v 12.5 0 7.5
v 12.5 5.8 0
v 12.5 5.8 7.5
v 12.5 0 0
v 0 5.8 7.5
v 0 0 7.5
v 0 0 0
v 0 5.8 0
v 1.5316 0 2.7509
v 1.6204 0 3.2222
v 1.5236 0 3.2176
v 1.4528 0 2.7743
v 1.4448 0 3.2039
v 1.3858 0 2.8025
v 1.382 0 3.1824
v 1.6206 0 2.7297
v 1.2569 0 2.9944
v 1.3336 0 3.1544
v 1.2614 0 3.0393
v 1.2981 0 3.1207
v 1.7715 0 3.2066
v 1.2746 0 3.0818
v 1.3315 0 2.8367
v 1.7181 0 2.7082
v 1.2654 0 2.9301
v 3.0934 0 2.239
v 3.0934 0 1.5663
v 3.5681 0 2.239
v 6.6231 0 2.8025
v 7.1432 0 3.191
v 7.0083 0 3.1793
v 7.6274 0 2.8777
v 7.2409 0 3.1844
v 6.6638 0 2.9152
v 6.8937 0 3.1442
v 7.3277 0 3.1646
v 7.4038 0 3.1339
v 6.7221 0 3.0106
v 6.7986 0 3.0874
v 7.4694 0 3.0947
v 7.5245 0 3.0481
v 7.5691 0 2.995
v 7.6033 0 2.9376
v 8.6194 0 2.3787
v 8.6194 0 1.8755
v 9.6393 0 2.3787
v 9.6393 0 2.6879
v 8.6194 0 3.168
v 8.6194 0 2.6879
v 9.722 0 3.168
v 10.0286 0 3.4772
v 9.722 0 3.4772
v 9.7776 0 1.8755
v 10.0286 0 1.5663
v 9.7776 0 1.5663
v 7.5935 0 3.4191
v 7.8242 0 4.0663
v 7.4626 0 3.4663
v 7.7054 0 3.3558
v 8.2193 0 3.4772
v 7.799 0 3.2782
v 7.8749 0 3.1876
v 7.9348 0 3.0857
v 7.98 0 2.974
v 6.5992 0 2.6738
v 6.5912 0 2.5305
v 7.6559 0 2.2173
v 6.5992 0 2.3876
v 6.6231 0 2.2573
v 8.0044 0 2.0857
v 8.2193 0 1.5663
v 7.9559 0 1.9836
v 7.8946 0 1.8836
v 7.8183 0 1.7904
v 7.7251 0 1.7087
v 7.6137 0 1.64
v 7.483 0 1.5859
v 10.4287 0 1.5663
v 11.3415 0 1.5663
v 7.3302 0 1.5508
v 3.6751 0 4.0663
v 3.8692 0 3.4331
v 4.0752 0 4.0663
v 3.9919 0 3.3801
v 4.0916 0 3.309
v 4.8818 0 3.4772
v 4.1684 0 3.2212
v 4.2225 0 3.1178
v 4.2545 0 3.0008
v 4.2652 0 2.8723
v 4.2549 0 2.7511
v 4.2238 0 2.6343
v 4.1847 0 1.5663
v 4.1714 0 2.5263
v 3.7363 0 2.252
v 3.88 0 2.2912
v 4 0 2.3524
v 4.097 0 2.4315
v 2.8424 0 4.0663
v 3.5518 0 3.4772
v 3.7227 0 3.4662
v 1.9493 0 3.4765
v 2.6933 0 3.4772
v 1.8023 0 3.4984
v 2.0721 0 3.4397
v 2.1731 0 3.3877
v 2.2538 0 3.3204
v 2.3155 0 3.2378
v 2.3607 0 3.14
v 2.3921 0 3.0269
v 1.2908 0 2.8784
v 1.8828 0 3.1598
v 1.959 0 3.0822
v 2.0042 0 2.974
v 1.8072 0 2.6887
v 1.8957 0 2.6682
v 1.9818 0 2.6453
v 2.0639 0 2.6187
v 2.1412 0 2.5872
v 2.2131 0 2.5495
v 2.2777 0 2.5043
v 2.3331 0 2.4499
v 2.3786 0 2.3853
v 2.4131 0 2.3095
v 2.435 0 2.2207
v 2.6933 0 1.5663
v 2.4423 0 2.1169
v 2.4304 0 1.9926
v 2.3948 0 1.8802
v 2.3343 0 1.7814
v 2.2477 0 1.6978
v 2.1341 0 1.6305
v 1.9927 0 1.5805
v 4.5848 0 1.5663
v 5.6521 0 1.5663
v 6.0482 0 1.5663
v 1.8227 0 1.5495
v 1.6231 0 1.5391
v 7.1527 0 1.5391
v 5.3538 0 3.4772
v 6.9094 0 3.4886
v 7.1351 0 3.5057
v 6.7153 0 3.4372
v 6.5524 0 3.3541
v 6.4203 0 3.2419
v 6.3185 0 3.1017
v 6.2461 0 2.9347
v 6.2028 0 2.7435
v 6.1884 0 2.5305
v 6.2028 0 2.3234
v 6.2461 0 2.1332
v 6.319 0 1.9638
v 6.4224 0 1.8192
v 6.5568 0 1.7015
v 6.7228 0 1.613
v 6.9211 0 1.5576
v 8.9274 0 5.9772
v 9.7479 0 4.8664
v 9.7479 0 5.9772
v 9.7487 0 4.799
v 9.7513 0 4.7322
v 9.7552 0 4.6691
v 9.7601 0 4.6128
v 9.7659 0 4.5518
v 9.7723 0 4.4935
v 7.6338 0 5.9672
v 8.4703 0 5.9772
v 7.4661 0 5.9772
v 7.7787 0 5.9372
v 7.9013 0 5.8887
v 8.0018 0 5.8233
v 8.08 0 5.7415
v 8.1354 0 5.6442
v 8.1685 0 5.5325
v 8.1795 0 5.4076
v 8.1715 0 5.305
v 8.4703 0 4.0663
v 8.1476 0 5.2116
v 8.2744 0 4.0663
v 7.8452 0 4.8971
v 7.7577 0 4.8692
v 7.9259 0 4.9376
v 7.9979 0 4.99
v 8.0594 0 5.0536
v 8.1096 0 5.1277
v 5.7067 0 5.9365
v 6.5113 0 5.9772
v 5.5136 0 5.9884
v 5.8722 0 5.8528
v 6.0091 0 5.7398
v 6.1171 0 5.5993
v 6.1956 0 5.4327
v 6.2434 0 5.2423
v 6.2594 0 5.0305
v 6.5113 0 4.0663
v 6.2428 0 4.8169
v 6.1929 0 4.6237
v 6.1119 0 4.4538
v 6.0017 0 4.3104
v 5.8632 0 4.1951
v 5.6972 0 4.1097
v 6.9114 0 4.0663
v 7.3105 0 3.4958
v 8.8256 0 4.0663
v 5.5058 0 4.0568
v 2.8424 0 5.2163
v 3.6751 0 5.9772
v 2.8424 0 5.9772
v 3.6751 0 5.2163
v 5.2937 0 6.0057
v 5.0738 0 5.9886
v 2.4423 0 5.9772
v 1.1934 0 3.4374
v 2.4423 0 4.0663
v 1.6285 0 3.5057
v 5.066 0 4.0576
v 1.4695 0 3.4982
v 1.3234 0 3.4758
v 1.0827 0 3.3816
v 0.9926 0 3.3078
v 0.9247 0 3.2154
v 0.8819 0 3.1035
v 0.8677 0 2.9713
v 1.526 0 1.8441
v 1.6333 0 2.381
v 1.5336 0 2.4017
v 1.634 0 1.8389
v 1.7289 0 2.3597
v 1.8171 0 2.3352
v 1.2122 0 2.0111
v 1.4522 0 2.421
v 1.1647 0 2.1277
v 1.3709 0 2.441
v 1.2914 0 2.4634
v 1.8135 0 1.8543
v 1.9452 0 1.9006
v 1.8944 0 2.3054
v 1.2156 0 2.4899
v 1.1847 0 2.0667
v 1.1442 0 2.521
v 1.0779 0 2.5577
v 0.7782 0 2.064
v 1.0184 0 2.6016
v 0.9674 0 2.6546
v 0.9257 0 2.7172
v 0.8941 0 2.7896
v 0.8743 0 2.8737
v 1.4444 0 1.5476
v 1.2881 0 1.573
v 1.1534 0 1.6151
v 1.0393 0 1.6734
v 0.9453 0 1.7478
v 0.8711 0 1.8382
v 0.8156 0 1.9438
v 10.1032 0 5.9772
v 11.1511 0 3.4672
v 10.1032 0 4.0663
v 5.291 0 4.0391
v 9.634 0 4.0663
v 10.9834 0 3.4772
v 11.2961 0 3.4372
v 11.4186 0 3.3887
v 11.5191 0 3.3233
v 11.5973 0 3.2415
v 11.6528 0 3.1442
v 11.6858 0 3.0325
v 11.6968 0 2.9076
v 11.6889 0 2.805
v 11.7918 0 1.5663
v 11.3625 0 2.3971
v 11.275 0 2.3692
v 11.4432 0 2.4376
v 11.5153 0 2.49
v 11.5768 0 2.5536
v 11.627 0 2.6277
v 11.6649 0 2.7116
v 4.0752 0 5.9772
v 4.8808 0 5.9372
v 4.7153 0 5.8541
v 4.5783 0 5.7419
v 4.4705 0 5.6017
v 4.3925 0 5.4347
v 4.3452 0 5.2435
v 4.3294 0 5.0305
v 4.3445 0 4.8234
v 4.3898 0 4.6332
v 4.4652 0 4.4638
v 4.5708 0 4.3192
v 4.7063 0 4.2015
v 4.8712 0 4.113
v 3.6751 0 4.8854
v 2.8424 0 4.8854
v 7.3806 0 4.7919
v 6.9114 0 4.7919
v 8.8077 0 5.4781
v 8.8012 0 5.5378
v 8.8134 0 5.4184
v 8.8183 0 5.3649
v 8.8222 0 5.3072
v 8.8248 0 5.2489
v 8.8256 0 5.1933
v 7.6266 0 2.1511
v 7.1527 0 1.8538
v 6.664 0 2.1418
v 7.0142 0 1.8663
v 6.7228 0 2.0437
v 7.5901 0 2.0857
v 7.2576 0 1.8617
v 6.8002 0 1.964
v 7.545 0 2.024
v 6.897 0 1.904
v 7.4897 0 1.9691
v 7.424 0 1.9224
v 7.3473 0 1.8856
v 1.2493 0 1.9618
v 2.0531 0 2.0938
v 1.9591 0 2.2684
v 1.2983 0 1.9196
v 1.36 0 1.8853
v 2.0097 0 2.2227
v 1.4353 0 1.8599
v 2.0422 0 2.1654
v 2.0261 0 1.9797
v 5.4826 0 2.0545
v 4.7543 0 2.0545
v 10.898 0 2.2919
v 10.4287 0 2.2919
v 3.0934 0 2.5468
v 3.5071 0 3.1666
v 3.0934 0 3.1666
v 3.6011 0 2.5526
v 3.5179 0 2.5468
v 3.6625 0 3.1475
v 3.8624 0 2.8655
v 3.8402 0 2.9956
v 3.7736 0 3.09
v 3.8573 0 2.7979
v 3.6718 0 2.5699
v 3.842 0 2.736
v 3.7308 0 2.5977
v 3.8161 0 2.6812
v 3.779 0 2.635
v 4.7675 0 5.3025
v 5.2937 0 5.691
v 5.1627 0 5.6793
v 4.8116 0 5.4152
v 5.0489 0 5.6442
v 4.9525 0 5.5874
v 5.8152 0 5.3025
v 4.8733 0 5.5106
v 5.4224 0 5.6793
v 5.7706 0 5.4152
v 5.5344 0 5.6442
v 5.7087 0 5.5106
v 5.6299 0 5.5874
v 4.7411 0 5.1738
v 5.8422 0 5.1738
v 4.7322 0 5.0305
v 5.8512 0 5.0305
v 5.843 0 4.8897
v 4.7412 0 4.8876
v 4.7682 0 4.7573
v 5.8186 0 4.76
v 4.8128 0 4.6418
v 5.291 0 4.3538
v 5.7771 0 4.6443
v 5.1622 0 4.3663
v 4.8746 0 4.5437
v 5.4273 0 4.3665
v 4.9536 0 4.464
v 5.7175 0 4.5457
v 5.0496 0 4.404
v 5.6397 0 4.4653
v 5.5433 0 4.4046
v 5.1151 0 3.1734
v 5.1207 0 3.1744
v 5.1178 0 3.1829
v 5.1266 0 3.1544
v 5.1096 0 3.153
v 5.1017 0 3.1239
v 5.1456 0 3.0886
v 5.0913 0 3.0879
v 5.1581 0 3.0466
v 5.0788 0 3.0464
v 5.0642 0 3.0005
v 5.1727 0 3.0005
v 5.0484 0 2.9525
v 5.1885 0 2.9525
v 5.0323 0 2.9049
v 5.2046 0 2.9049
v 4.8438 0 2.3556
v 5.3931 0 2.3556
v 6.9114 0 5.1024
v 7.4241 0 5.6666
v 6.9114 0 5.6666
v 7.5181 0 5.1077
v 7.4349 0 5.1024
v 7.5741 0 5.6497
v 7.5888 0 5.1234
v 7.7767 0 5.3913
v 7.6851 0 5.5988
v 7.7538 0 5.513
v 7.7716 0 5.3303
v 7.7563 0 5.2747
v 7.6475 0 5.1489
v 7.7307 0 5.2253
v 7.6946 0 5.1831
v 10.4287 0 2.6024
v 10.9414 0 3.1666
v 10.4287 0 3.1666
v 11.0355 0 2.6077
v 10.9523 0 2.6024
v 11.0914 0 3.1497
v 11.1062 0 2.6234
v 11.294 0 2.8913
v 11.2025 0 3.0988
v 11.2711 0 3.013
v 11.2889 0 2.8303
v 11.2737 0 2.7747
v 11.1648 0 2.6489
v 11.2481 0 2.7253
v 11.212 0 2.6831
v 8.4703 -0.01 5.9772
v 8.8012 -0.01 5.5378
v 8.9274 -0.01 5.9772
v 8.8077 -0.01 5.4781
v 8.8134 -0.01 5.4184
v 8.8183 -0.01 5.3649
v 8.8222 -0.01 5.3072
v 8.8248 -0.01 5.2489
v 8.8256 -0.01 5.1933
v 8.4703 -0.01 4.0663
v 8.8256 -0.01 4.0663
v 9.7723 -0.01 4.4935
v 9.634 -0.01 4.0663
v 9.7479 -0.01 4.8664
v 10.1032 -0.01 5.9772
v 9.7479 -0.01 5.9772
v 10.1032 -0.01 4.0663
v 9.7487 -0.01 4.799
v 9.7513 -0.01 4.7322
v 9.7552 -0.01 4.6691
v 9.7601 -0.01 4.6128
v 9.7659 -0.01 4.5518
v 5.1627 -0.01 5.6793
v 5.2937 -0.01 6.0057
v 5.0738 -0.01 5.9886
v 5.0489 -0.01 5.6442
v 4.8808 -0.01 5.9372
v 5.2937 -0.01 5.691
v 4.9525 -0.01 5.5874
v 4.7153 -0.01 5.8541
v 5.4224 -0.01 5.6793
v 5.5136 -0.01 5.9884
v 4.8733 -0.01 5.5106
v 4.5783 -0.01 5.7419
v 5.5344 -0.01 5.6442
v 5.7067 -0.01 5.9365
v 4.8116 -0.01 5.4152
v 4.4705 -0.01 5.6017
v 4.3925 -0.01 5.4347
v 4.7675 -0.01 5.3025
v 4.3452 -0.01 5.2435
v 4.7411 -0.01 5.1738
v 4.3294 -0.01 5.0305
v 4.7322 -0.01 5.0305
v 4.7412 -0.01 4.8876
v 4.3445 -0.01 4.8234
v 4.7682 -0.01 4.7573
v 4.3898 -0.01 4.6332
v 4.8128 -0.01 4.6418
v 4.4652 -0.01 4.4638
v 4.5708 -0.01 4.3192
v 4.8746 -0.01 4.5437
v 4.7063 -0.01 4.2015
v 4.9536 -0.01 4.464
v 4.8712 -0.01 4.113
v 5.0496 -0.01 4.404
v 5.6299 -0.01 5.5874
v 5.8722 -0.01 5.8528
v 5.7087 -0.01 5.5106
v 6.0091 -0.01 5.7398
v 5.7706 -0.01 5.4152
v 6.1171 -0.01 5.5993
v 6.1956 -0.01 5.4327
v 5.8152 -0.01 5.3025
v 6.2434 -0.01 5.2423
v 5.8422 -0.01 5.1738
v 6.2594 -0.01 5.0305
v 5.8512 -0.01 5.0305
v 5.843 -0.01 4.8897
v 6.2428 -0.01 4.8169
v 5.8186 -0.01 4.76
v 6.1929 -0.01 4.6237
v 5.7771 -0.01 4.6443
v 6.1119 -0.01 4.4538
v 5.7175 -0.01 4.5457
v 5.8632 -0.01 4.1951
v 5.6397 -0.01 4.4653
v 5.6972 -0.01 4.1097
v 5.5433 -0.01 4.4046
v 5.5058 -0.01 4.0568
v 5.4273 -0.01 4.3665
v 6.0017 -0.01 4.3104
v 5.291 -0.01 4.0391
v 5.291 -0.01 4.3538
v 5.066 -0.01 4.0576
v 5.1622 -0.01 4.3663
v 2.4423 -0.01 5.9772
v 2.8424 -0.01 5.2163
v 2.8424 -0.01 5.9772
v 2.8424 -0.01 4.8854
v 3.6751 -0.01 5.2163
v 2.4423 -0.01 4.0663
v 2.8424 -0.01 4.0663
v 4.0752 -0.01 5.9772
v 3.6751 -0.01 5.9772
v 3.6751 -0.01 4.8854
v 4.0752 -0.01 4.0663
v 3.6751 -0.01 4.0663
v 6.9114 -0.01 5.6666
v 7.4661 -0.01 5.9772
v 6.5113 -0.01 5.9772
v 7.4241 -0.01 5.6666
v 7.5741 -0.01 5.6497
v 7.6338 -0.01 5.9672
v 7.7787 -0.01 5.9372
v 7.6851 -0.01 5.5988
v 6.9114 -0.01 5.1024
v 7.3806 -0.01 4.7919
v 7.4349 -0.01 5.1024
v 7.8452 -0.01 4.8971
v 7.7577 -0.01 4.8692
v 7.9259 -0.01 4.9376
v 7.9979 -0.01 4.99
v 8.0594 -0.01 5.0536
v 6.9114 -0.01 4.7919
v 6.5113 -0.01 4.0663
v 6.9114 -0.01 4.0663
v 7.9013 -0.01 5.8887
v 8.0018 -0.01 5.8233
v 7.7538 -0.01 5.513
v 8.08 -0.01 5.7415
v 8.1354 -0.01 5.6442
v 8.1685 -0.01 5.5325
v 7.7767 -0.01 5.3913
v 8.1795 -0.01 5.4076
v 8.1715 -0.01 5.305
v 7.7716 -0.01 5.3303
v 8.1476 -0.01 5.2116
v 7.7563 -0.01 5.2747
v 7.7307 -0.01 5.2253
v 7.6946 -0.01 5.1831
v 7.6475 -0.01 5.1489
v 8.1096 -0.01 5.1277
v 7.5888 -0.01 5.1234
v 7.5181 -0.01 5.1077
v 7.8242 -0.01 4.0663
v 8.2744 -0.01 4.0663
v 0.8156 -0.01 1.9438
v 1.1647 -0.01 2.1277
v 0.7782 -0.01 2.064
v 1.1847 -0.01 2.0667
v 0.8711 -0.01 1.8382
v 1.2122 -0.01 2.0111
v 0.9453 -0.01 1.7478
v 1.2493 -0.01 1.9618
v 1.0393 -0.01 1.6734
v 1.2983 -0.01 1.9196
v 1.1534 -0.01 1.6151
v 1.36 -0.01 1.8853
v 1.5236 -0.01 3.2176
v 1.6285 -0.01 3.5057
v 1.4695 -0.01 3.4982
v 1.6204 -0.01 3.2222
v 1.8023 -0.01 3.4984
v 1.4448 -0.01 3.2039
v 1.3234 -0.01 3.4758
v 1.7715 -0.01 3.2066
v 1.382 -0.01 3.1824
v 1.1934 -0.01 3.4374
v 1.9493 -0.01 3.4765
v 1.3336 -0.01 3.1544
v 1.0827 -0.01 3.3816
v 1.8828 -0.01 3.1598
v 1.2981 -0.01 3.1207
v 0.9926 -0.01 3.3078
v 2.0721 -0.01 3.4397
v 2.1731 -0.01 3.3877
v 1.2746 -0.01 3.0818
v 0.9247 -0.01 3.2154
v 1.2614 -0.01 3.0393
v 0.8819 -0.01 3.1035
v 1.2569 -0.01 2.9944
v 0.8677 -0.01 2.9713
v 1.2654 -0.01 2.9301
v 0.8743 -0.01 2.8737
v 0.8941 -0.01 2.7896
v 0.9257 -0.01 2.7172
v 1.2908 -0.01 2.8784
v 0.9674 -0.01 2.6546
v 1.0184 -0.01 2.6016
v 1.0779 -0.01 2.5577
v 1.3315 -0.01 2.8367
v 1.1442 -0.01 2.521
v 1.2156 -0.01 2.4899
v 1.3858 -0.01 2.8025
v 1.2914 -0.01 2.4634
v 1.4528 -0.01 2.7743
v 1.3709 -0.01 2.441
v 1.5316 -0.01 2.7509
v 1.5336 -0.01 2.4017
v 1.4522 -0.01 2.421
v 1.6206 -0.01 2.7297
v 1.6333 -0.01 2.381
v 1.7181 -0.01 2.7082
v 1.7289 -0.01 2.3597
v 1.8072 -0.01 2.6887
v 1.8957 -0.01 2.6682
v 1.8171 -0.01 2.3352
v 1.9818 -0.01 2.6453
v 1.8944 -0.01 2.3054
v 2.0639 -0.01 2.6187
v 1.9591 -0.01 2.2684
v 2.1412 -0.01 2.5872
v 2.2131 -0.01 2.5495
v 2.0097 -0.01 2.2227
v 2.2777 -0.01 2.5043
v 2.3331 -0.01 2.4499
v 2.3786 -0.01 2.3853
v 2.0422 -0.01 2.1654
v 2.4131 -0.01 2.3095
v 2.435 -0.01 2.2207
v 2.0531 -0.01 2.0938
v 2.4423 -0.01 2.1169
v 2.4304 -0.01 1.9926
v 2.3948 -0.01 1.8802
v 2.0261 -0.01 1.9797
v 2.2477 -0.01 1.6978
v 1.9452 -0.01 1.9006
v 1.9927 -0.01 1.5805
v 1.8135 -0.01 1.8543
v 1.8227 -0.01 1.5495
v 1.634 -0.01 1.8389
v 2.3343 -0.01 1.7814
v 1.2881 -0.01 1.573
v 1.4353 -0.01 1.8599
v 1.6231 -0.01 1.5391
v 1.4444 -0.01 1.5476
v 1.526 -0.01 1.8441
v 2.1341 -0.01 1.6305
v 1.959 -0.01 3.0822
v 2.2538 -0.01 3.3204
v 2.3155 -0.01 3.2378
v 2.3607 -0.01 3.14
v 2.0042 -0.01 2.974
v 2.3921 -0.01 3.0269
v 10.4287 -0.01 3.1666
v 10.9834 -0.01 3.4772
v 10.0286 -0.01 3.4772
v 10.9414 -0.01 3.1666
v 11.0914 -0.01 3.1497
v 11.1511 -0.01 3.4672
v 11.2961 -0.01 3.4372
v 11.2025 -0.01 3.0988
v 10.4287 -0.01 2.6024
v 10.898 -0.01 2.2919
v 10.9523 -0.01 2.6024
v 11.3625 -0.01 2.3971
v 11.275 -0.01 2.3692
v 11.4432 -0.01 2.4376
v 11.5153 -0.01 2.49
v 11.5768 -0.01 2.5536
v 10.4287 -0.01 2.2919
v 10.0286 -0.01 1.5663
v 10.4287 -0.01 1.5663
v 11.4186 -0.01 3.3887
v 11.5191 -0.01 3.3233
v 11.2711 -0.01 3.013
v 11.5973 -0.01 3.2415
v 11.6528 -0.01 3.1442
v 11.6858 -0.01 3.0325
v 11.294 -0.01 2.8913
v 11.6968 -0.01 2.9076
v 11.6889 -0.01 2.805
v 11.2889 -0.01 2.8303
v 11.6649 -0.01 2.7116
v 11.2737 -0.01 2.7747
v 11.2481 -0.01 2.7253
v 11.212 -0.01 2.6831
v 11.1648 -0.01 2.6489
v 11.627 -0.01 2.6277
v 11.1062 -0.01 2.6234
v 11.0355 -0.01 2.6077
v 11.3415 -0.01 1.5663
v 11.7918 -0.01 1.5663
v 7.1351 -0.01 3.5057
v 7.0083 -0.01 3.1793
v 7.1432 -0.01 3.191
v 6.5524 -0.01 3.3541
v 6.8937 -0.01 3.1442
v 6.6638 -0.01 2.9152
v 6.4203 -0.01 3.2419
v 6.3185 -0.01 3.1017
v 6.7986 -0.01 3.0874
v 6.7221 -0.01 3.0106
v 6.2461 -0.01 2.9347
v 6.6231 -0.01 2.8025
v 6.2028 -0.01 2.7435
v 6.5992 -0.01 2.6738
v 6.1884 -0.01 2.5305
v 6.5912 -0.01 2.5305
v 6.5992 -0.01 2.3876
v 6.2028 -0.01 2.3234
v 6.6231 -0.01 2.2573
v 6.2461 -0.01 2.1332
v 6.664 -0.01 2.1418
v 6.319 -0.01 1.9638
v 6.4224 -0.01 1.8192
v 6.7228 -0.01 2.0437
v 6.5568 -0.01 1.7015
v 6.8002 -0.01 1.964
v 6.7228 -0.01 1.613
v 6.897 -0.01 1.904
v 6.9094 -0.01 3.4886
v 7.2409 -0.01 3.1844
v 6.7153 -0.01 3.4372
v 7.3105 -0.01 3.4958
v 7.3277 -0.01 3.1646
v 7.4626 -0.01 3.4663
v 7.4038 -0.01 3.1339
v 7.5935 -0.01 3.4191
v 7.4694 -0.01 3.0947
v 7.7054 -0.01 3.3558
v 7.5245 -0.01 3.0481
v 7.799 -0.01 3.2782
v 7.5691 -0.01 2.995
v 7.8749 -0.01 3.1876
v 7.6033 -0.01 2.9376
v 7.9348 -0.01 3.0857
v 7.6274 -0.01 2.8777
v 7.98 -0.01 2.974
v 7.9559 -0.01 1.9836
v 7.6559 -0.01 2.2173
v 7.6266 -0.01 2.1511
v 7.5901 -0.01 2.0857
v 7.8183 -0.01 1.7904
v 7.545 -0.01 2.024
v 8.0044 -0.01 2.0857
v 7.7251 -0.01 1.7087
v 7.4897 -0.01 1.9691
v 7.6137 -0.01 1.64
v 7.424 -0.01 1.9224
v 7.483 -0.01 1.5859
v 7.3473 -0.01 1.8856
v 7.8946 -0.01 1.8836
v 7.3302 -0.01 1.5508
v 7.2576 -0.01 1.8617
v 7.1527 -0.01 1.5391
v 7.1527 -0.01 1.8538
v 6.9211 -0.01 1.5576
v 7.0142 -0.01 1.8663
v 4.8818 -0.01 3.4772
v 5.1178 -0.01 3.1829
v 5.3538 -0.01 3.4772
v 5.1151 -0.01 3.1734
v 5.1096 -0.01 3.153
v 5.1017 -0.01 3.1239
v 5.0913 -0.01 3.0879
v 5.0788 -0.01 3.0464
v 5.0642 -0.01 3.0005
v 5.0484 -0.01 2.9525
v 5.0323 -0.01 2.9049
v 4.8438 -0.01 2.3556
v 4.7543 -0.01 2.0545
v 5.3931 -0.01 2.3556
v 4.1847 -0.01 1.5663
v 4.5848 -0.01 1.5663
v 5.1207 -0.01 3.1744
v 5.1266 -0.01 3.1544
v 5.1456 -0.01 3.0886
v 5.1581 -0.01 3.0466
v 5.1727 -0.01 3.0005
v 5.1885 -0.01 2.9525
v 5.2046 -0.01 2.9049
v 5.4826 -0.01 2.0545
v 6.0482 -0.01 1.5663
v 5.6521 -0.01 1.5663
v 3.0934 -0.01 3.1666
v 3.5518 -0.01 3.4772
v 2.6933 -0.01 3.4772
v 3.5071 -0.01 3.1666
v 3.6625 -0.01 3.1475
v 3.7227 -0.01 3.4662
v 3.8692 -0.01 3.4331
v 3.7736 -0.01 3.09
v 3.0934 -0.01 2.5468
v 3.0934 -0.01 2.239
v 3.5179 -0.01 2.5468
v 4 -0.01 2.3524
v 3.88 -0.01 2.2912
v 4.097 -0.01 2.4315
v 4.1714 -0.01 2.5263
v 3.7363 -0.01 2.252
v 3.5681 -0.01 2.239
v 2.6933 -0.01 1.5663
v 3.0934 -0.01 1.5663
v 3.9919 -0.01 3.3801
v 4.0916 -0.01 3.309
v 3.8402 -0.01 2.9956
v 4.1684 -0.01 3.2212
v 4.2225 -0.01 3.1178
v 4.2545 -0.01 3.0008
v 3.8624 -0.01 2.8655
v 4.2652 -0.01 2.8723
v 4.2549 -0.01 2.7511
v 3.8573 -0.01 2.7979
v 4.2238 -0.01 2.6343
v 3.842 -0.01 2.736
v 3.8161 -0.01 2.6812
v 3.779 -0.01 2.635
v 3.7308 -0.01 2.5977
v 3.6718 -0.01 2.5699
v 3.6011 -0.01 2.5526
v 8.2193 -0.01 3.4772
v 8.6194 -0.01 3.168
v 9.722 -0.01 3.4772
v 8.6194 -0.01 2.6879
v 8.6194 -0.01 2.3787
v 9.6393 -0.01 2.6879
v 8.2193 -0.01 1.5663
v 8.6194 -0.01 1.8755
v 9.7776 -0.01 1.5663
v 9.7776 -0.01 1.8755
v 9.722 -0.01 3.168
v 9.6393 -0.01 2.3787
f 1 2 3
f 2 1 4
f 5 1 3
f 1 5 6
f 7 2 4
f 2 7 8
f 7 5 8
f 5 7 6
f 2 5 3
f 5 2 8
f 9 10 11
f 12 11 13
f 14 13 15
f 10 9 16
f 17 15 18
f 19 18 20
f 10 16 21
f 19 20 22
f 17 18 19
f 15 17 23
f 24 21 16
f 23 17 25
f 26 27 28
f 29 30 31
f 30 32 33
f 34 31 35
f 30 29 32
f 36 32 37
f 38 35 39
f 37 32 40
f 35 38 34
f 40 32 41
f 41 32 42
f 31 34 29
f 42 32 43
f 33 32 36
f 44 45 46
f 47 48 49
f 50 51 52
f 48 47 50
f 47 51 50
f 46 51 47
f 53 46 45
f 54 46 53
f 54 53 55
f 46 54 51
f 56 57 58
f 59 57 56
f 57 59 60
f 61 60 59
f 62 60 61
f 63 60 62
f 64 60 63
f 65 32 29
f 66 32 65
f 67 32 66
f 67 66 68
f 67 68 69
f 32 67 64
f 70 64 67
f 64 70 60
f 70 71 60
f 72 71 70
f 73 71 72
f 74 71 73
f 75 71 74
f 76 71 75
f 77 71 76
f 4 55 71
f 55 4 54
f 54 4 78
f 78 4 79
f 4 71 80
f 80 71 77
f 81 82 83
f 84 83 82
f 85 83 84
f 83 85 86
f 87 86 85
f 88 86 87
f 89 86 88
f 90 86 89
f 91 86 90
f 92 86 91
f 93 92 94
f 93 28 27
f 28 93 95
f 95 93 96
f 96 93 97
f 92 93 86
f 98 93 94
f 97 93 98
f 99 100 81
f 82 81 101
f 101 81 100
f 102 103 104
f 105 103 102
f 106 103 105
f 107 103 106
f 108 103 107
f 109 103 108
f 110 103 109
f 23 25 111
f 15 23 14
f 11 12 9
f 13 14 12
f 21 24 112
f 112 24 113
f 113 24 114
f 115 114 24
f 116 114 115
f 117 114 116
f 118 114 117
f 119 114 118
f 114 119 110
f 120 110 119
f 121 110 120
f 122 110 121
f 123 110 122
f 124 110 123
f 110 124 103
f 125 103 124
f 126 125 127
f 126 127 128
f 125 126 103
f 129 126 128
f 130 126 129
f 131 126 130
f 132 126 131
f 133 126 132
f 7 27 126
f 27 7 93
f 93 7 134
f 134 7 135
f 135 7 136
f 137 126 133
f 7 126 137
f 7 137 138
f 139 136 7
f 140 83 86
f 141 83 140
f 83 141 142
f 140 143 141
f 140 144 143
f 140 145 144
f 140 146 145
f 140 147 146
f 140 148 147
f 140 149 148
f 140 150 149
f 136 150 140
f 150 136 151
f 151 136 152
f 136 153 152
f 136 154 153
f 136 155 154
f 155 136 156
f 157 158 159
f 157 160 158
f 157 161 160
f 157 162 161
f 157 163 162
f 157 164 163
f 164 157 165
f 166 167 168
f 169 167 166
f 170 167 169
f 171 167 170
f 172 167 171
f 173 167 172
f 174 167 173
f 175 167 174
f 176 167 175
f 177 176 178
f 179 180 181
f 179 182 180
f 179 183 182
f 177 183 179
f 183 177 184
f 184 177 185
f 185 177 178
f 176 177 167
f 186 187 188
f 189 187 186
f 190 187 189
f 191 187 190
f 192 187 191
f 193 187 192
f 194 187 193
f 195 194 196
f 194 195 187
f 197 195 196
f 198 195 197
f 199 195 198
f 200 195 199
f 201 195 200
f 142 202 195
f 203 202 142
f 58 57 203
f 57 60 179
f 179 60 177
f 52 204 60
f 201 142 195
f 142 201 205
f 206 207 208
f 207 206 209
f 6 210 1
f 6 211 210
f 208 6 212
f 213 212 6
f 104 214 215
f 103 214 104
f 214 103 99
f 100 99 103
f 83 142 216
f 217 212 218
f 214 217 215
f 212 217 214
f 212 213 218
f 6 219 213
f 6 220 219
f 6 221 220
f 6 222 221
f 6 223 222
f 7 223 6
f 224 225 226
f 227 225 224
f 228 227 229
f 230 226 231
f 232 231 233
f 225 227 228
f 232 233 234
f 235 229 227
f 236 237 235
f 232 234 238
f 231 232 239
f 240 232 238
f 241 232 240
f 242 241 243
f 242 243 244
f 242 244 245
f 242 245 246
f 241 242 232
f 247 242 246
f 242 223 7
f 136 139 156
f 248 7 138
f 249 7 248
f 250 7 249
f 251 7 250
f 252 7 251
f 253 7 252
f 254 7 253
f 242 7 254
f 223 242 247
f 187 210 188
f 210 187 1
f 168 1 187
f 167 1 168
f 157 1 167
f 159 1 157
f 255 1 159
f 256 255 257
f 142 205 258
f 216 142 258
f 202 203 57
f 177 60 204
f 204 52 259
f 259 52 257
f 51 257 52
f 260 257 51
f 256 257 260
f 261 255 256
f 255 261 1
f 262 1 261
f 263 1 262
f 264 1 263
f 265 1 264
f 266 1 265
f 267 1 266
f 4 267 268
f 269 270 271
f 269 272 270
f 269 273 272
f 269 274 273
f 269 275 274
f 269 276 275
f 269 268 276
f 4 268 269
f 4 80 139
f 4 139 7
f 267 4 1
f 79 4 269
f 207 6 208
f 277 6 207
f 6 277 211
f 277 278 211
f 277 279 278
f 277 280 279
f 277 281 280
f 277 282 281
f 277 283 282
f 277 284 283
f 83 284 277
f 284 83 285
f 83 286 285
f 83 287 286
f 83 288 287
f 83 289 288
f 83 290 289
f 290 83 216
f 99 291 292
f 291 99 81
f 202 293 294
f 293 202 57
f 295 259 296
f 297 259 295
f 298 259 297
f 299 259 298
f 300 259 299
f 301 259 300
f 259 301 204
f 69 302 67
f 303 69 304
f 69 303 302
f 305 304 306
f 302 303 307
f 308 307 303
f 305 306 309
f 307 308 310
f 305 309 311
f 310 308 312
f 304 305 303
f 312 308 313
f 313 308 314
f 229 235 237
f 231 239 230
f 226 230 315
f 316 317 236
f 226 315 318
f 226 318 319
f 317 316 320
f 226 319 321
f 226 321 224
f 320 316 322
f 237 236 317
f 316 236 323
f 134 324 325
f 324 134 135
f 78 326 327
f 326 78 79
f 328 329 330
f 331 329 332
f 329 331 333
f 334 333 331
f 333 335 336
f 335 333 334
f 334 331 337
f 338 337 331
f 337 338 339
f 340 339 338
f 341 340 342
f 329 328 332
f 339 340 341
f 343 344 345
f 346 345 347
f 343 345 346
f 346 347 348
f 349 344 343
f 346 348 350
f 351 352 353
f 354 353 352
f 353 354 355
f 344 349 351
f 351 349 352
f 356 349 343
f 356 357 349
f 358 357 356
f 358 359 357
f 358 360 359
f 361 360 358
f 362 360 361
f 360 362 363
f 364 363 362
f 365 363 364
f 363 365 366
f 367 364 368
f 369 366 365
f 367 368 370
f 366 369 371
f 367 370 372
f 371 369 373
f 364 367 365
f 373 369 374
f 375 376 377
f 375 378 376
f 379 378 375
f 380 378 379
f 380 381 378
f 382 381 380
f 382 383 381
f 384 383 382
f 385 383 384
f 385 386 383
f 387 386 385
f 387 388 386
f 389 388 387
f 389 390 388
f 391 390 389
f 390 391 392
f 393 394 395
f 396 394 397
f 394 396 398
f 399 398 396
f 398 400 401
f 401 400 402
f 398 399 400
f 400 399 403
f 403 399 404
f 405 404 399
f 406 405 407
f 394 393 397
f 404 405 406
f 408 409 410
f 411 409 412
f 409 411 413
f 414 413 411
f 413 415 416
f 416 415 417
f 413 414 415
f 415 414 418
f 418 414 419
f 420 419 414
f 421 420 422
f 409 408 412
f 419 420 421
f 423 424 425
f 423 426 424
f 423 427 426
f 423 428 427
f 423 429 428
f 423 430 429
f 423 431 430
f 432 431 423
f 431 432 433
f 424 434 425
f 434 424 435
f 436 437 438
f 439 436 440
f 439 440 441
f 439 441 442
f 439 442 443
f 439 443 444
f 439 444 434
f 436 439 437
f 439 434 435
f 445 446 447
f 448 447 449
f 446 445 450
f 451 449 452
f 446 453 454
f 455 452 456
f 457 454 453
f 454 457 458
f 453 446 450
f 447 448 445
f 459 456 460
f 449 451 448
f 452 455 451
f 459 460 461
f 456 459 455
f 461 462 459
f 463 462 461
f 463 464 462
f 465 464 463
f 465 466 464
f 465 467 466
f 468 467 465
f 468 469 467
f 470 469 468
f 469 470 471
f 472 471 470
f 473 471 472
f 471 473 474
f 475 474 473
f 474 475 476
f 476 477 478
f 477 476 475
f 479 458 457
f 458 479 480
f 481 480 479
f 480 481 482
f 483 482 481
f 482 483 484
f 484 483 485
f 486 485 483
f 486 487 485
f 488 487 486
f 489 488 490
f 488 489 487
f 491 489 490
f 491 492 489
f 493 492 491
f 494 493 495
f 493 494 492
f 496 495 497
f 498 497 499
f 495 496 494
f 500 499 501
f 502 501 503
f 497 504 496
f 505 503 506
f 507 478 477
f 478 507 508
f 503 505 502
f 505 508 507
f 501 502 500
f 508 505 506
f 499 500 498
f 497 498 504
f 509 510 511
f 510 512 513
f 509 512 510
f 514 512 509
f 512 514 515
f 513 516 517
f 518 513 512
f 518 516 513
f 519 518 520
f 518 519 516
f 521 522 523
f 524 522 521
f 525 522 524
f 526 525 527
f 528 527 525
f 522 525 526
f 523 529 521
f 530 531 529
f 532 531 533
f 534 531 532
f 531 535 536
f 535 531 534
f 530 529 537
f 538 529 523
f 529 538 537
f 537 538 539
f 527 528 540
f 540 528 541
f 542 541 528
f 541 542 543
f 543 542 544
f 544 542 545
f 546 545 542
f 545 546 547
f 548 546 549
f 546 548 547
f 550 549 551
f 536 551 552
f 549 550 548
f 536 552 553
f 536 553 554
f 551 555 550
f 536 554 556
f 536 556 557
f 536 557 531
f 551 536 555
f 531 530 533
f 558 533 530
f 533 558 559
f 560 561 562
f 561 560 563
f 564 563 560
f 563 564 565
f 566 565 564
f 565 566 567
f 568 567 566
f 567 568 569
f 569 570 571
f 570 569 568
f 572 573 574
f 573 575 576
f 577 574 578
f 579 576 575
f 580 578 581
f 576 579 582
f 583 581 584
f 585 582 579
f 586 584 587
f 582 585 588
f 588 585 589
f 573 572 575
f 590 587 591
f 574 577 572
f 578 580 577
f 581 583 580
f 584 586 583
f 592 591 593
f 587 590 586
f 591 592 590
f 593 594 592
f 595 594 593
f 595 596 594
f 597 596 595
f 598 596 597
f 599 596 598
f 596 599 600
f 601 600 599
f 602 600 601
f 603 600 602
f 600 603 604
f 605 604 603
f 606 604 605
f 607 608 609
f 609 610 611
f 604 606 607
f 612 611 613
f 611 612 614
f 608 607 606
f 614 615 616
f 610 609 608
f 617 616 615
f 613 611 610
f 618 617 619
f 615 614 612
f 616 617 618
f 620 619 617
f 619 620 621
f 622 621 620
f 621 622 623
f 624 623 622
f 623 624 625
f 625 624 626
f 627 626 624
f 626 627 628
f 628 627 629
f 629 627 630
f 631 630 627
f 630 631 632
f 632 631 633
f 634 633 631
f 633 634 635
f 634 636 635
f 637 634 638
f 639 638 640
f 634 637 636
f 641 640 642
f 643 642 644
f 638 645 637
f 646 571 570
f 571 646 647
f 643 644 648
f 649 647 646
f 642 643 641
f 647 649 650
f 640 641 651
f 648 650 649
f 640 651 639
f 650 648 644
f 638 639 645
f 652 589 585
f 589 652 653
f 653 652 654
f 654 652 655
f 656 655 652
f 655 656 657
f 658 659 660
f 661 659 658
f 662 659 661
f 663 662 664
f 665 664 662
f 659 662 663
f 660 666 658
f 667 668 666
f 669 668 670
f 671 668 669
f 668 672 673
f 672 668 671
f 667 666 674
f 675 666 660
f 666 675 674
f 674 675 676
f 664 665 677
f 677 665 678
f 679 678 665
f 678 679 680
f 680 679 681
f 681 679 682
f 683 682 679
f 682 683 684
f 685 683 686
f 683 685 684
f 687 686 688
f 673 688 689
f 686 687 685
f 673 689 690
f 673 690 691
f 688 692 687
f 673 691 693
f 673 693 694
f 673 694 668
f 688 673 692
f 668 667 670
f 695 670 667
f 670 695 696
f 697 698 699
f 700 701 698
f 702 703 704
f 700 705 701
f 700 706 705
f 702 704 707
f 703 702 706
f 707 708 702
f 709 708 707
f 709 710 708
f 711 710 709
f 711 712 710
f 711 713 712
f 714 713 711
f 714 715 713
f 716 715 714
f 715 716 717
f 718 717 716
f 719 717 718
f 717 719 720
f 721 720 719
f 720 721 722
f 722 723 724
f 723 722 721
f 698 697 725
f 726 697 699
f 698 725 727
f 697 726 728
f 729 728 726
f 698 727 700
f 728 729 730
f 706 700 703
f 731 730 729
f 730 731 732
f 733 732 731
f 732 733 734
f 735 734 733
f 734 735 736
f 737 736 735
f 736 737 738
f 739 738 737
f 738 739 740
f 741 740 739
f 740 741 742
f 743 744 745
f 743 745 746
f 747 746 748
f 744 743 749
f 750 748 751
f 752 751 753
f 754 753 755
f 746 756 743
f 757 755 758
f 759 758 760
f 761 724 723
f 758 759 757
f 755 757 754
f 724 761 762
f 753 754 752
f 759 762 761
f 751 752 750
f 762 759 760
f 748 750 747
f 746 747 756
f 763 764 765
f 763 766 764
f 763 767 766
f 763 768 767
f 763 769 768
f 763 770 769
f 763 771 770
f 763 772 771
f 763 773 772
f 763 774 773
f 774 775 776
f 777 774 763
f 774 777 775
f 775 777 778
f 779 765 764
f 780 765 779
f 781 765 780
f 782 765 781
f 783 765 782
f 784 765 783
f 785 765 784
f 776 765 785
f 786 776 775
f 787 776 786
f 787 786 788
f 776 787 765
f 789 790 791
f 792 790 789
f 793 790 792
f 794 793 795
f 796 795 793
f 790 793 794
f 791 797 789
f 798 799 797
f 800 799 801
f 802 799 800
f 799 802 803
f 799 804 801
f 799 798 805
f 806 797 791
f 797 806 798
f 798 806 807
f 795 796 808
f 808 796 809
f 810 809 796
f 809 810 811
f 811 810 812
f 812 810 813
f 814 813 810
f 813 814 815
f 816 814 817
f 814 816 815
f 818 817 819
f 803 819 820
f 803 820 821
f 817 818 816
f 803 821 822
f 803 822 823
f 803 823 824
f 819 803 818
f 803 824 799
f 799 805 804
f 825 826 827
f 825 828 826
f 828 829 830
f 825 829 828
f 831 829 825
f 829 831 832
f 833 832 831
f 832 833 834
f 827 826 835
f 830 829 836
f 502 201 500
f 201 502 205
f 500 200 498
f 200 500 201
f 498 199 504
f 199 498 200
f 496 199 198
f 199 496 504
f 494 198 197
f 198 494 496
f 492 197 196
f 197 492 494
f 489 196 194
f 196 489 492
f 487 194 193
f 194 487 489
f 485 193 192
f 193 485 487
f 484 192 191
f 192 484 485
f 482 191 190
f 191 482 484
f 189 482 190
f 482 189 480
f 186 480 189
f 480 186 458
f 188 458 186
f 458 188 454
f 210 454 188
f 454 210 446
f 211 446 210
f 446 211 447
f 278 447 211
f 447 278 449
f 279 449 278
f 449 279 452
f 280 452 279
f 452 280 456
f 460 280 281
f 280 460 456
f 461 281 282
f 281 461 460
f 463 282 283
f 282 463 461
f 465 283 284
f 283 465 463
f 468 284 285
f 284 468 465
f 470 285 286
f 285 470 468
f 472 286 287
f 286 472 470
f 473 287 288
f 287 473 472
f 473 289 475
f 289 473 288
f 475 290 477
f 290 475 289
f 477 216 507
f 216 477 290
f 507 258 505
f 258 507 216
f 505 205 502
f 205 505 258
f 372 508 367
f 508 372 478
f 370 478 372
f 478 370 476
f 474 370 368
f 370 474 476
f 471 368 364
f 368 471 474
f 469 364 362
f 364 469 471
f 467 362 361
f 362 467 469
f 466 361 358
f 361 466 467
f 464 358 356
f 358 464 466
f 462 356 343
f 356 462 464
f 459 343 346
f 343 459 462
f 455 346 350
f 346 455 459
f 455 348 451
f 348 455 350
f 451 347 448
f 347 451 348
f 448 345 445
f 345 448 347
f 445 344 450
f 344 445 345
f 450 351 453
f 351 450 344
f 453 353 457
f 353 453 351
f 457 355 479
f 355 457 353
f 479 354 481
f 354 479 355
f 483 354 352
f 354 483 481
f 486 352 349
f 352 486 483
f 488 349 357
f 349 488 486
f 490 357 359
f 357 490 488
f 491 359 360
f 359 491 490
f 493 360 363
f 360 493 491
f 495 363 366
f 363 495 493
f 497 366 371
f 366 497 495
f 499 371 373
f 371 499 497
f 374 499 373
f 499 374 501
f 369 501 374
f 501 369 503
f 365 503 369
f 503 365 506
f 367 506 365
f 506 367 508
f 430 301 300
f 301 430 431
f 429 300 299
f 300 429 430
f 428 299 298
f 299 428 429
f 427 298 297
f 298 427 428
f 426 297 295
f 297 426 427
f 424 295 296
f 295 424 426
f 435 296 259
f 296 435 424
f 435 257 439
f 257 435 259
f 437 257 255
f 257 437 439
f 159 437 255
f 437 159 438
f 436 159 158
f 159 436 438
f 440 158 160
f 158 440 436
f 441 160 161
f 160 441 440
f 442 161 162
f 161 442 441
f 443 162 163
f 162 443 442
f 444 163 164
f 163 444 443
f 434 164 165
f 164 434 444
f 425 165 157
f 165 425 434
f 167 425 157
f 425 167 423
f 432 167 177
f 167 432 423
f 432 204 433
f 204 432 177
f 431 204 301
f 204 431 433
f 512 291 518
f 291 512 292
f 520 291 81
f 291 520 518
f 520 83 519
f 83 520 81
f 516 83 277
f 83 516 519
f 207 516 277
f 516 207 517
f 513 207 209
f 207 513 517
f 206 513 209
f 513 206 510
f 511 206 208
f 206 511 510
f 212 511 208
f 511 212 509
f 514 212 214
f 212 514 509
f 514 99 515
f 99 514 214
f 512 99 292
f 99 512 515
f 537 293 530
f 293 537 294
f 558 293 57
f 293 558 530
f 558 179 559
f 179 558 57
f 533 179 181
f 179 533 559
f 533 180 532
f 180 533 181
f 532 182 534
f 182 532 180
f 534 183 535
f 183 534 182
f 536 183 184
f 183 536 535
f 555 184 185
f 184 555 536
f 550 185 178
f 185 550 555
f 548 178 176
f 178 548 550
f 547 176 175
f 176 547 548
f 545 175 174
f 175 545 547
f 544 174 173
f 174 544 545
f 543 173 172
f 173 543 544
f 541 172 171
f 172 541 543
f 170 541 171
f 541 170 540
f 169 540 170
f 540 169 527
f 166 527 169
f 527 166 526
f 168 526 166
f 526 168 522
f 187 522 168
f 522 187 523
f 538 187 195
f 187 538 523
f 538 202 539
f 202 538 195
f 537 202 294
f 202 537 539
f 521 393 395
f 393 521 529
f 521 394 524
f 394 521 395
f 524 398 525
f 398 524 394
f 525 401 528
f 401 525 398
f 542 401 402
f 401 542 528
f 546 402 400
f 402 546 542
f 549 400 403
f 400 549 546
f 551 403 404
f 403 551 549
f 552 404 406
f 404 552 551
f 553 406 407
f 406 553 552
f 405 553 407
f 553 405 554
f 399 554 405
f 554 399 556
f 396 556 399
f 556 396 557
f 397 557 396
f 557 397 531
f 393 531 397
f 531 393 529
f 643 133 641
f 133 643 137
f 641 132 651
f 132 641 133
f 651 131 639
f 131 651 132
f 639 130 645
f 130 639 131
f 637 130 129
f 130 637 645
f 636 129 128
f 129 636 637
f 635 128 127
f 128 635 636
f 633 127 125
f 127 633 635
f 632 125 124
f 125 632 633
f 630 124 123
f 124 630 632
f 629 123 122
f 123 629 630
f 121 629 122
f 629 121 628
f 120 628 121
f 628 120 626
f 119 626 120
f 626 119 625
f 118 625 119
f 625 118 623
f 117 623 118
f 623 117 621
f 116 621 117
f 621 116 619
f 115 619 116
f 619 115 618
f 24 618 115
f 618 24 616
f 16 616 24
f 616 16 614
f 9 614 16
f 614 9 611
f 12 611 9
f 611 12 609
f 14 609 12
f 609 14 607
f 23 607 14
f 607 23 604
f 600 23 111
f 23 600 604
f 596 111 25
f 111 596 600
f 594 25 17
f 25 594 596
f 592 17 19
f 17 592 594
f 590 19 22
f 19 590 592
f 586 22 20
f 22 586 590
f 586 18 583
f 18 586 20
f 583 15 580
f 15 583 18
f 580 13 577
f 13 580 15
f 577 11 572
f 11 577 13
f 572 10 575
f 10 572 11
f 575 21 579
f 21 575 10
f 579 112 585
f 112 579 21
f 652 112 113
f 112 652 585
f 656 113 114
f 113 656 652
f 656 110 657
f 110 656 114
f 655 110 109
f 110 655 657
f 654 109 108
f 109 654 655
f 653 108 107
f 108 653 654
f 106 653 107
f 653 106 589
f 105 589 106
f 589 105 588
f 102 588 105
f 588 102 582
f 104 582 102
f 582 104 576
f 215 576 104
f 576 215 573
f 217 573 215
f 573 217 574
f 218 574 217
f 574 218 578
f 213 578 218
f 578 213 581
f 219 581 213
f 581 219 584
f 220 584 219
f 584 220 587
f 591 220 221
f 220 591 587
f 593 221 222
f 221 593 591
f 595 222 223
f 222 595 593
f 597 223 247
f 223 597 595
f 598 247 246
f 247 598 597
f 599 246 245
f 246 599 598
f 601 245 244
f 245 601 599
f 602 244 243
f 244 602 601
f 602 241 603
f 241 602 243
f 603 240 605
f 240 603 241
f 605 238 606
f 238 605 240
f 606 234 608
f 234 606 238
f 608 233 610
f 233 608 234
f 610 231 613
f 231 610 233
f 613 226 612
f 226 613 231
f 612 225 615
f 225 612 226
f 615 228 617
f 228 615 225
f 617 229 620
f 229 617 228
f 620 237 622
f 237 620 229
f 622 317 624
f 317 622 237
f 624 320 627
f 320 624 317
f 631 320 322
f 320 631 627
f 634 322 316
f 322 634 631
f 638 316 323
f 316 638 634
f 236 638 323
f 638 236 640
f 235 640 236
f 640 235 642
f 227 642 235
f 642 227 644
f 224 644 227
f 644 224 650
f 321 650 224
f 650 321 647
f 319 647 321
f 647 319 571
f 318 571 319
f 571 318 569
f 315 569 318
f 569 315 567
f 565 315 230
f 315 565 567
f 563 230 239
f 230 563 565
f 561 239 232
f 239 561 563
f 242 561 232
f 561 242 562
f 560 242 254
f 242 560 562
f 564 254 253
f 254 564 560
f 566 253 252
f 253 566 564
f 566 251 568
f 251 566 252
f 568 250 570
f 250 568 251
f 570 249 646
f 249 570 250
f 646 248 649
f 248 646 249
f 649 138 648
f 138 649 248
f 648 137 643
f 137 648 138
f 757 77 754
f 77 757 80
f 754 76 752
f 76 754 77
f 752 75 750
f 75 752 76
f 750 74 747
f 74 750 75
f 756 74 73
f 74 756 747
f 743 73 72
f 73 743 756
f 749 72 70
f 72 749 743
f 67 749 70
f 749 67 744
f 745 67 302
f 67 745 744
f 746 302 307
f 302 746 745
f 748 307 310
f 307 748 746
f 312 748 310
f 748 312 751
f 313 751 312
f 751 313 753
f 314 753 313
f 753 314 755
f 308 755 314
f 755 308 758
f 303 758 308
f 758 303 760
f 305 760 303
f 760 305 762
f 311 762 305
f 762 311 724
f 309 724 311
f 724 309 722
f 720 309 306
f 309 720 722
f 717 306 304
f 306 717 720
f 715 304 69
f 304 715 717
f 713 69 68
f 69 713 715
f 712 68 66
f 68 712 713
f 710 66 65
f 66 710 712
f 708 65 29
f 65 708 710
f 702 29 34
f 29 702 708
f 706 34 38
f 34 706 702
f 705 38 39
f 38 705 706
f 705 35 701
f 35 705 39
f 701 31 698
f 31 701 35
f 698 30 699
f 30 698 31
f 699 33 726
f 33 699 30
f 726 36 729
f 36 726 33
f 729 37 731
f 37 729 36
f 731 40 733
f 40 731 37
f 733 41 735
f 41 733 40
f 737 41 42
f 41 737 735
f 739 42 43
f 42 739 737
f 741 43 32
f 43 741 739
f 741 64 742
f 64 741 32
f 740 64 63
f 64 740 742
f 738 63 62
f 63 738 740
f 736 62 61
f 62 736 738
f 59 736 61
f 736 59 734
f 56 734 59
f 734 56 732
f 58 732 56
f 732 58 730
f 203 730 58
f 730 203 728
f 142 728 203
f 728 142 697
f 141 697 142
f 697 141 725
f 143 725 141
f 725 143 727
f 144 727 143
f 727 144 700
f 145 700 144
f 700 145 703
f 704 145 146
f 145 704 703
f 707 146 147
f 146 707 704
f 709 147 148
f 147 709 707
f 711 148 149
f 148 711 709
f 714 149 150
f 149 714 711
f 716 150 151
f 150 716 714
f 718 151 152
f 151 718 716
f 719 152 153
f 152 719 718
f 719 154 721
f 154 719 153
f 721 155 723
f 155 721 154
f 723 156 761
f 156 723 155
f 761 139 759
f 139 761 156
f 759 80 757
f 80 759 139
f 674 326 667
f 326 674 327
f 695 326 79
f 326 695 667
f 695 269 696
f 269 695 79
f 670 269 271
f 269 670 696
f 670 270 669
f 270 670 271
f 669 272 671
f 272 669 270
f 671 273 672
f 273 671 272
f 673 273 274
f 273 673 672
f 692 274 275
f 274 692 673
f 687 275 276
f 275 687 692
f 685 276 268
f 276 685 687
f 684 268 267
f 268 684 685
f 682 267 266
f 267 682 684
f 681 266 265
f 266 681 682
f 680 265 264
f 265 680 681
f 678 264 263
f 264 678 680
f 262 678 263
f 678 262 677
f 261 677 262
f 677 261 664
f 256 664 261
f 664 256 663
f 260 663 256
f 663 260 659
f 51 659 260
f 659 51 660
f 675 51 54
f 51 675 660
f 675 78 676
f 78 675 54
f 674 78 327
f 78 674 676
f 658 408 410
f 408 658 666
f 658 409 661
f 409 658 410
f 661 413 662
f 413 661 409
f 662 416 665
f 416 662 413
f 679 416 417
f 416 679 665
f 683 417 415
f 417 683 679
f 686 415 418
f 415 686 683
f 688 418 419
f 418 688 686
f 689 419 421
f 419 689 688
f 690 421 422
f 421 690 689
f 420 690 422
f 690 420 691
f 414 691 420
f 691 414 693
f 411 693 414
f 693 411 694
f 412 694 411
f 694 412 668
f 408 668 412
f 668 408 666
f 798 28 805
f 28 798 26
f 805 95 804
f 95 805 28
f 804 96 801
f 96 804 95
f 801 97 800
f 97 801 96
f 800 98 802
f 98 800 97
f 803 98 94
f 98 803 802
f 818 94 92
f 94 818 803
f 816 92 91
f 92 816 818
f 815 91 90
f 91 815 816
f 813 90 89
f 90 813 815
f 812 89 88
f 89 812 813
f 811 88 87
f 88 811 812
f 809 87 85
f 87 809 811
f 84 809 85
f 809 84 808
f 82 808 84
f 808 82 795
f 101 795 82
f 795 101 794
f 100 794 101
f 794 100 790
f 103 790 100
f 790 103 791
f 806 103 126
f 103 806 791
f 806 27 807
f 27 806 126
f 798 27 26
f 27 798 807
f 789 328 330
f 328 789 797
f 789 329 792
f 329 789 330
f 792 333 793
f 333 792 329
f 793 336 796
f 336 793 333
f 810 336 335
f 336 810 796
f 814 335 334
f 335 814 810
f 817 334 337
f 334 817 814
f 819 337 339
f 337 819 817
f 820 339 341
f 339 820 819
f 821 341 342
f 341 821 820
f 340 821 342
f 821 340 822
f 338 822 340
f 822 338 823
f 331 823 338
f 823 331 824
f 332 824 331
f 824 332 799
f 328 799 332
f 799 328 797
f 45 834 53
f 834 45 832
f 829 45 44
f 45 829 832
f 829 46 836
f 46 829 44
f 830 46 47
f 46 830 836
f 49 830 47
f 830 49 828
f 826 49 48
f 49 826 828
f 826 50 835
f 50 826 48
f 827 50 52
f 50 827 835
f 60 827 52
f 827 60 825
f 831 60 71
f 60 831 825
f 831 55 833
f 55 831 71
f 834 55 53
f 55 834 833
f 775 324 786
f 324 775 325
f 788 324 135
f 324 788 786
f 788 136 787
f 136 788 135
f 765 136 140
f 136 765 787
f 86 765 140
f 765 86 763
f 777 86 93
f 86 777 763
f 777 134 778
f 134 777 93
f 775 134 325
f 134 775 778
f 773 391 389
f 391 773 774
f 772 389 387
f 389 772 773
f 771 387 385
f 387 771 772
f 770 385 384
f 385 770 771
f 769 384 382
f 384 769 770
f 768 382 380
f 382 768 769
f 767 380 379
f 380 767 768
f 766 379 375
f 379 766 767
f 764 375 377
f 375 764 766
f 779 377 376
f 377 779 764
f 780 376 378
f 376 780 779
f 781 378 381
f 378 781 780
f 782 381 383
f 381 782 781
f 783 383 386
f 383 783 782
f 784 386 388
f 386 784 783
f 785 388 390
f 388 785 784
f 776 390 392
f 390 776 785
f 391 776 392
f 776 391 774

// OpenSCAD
// Elevator Horn Spacer
// Dimensions: 12.5mm x 5.8mm x 7.5mm

// ========== Parameters ==========

width = 12.5;   // X dimension
depth = 5.8;    // Y dimension
height = 7.5;   // Z dimension

// Text parameters
text_line1 = "HORN";
text_line2 = "SPACER";
text_size = 2;          // Font size in mm
text_depth = 0.5;       // How deep to emboss
text_font = "Liberation Sans:style=Bold";
line_spacing = 0.5;     // Gap between lines

// Color parameters
body_color = "SteelBlue";
text_color = "White";

// ========== Modules ==========

module text_shape() {
    // 2D text shape - two lines centered
    line_height = text_size + line_spacing;

    // Line 1 (HORN) - upper
    translate([0, line_height/2])
        text(text_line1, size = text_size, font = text_font,
             halign = "center", valign = "center");

    // Line 2 (SPACER) - lower
    translate([0, -line_height/2])
        text(text_line2, size = text_size, font = text_font,
             halign = "center", valign = "center");
}

module embossed_text() {
    // Position text centered on the front face (Y=0)
    // Rotate to stand upright on the XZ plane
    translate([width/2, -0.01, height/2])
        rotate([90, 0, 0])
            linear_extrude(height = text_depth + 0.01)
                text_shape();
}

module text_inlay() {
    // Inlay piece that fits into the embossed area
    // Slightly thinner than emboss depth for fit
    inlay_thickness = text_depth - 0.1;
    translate([width/2, inlay_thickness - 0.01, height/2])
        rotate([90, 0, 0])
            linear_extrude(height = inlay_thickness)
                text_shape();
}

// ========== Main Assembly ==========

module elevator_horn_spacer_body() {
    difference() {
        cube([width, depth, height]);
        embossed_text();
    }
}

module elevator_horn_spacer() {
    color(body_color) elevator_horn_spacer_body();
    color(text_color) text_inlay();
}

// ========== Render ==========

// Full assembly with colors (for preview)
elevator_horn_spacer();

// Export these separately for multi-color printing:
//elevator_horn_spacer_body();
//text_inlay();
